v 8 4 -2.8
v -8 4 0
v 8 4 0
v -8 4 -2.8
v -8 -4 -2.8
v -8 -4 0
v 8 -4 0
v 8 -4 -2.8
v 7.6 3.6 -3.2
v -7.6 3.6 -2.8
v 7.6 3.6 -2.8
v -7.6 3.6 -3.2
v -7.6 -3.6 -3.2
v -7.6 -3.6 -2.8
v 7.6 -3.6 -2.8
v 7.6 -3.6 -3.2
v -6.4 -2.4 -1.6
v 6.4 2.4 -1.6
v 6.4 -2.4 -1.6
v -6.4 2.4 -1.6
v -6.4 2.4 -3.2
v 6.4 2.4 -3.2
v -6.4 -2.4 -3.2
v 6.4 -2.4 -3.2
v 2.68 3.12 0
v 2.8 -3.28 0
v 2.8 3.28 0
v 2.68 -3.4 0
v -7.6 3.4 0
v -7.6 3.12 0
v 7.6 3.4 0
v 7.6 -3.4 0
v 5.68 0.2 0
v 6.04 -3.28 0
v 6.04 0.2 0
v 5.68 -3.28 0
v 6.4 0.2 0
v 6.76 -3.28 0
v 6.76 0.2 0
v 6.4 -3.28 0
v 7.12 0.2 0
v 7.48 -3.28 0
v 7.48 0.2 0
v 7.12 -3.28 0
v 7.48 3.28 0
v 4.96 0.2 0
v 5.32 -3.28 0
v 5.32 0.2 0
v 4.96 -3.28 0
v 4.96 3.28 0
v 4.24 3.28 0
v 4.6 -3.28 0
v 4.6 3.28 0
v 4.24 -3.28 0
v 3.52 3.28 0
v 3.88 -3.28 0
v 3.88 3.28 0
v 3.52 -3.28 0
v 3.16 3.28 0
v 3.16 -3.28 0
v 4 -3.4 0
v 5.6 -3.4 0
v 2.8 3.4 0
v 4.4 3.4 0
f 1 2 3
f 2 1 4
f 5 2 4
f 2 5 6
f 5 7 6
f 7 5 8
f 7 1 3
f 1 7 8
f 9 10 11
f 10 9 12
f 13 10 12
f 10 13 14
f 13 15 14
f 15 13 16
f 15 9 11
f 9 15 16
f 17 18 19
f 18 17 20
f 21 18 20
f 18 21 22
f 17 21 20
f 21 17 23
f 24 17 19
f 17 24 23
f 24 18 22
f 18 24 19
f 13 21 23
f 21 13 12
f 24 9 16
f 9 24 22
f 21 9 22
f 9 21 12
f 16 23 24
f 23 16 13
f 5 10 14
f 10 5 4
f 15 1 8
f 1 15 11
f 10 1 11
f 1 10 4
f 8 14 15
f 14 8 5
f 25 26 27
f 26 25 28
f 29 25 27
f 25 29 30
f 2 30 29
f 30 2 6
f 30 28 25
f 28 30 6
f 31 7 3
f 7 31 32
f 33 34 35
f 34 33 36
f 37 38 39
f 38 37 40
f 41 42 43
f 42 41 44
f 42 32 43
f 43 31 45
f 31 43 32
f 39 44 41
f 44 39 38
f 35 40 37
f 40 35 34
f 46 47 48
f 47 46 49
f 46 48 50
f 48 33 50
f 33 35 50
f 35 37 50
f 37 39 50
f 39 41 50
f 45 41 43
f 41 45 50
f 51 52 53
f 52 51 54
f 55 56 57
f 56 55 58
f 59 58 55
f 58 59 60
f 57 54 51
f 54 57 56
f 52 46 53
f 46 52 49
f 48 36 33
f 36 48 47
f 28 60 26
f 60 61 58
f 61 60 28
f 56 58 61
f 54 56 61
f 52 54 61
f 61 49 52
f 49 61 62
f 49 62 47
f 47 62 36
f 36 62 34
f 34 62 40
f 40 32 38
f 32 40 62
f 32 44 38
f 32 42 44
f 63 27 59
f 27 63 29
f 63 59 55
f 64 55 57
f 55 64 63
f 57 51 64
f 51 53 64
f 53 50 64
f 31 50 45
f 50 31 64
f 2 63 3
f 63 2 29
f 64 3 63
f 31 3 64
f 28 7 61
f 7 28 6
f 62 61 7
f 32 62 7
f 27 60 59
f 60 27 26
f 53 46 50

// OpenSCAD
// file: ../p/box5.scad
use <../lib.scad>
function ldraw_lib__box5() = [
// 0 Box with 5 Faces and All Edges
// 0 Name: box5.dat
// 0 Author: James Jessiman
// 0 !LDRAW_ORG Primitive UPDATE 2012-01
// 0 !LICENSE Licensed under CC BY 2.0 and CC BY 4.0 : see CAreadme.txt
// 
// 0 BFC CERTIFY CCW
  [0,"BFC","CERTIFY"],
  [0,"BFC","CCW"],
// 
// 0 !HISTORY 2002-04-03 [sbliss] Modified for BFC compliance
// 0 !HISTORY 2002-04-25 [PTadmin] Official Update 2002-02
// 0 !HISTORY 2007-06-24 [PTadmin] Header formatted for Contributor Agreement
// 0 !HISTORY 2008-07-01 [PTadmin] Official Update 2008-01
// 0 !HISTORY 2012-02-16 [Philo] Changed to CCW
// 0 !HISTORY 2012-03-30 [PTadmin] Official Update 2012-01
// 
// 
// 2 24 1 1 1 -1 1 1
  [2,24,1,1,1,-1,1,1],
// 2 24 -1 1 1 -1 1 -1
  [2,24,-1,1,1,-1,1,-1],
// 2 24 -1 1 -1 1 1 -1
  [2,24,-1,1,-1,1,1,-1],
// 2 24 1 1 -1 1 1 1
  [2,24,1,1,-1,1,1,1],
// 2 24 1 0 1 -1 0 1
  [2,24,1,0,1,-1,0,1],
// 2 24 -1 0 1 -1 0 -1
  [2,24,-1,0,1,-1,0,-1],
// 2 24 -1 0 -1 1 0 -1
  [2,24,-1,0,-1,1,0,-1],
// 2 24 1 0 -1 1 0 1
  [2,24,1,0,-1,1,0,1],
// 2 24 1 0 1 1 1 1
  [2,24,1,0,1,1,1,1],
// 2 24 -1 0 1 -1 1 1
  [2,24,-1,0,1,-1,1,1],
// 2 24 1 0 -1 1 1 -1
  [2,24,1,0,-1,1,1,-1],
// 2 24 -1 0 -1 -1 1 -1
  [2,24,-1,0,-1,-1,1,-1],
// 4 16 -1 1 1 1 1 1 1 1 -1 -1 1 -1
  [4,16,-1,1,1,1,1,1,1,1,-1,-1,1,-1],
// 4 16 -1 1 1 -1 0 1 1 0 1 1 1 1
  [4,16,-1,1,1,-1,0,1,1,0,1,1,1,1],
// 4 16 -1 1 -1 -1 0 -1 -1 0 1 -1 1 1
  [4,16,-1,1,-1,-1,0,-1,-1,0,1,-1,1,1],
// 4 16 1 1 -1 1 0 -1 -1 0 -1 -1 1 -1
  [4,16,1,1,-1,1,0,-1,-1,0,-1,-1,1,-1],
// 4 16 1 1 1 1 0 1 1 0 -1 1 1 -1
  [4,16,1,1,1,1,0,1,1,0,-1,1,1,-1],
];
module ldraw_lib__box5(step=0, col=false, unit=2/5, alt=false, line=0.2, solid=!$preview)
    makepoly(ldraw_lib__box5(), step=step, col=col, unit=unit, alt=alt, line=line, solid=solid);
ldraw_lib__box5(line=0.2);
// file: ../p/box4.scad
use <../lib.scad>
function ldraw_lib__box4() = [
// 0 Box with 4 Faces (2 Parallel Pairs) and All Edges
// 0 Name: box4.dat
// 0 Author: James Jessiman
// 0 !LDRAW_ORG Primitive UPDATE 2012-01
// 0 !LICENSE Licensed under CC BY 2.0 and CC BY 4.0 : see CAreadme.txt
// 
// 0 BFC CERTIFY CCW
  [0,"BFC","CERTIFY"],
  [0,"BFC","CCW"],
// 
// 0 !HISTORY 2002-04-03 [sbliss] Modified for BFC compliance
// 0 !HISTORY 2002-04-25 [PTadmin] Official Update 2002-02
// 0 !HISTORY 2007-06-24 [PTadmin] Header formatted for Contributor Agreement
// 0 !HISTORY 2008-07-01 [PTadmin] Official Update 2008-01
// 0 !HISTORY 2012-02-16 [Philo] Changed to CCW
// 0 !HISTORY 2012-03-30 [PTadmin] Official Update 2012-01
// 
// 
// 2 24 1 1 1 -1 1 1
  [2,24,1,1,1,-1,1,1],
// 2 24 -1 1 1 -1 1 -1
  [2,24,-1,1,1,-1,1,-1],
// 2 24 -1 1 -1 1 1 -1
  [2,24,-1,1,-1,1,1,-1],
// 2 24 1 1 -1 1 1 1
  [2,24,1,1,-1,1,1,1],
// 2 24 1 0 1 -1 0 1
  [2,24,1,0,1,-1,0,1],
// 2 24 -1 0 1 -1 0 -1
  [2,24,-1,0,1,-1,0,-1],
// 2 24 -1 0 -1 1 0 -1
  [2,24,-1,0,-1,1,0,-1],
// 2 24 1 0 -1 1 0 1
  [2,24,1,0,-1,1,0,1],
// 2 24 1 0 1 1 1 1
  [2,24,1,0,1,1,1,1],
// 2 24 -1 0 1 -1 1 1
  [2,24,-1,0,1,-1,1,1],
// 2 24 1 0 -1 1 1 -1
  [2,24,1,0,-1,1,1,-1],
// 2 24 -1 0 -1 -1 1 -1
  [2,24,-1,0,-1,-1,1,-1],
// 4 16 -1 1 1 -1 0 1 1 0 1 1 1 1
  [4,16,-1,1,1,-1,0,1,1,0,1,1,1,1],
// 4 16 -1 1 -1 -1 0 -1 -1 0 1 -1 1 1
  [4,16,-1,1,-1,-1,0,-1,-1,0,1,-1,1,1],
// 4 16 1 1 -1 1 0 -1 -1 0 -1 -1 1 -1
  [4,16,1,1,-1,1,0,-1,-1,0,-1,-1,1,-1],
// 4 16 1 1 1 1 0 1 1 0 -1 1 1 -1
  [4,16,1,1,1,1,0,1,1,0,-1,1,1,-1],
];
module ldraw_lib__box4(step=0, col=false, unit=2/5, alt=false, line=0.2, solid=!$preview)
    makepoly(ldraw_lib__box4(), step=step, col=col, unit=unit, alt=alt, line=line, solid=solid);
ldraw_lib__box4(line=0.2);
// file: s/3069bs01.scad
use <../../lib.scad>
use <../../p/box4.scad>
use <../../p/box5.scad>
function ldraw_lib__s__3069bs01() = [
// 0 ~Tile  1 x  2 with Groove without Top Face
// 0 Name: s\3069bs01.dat
// 0 Author: Santeri Piippo [arezey]
// 0 !LDRAW_ORG Subpart UPDATE 2010-02
// 0 !LICENSE Licensed under CC BY 2.0 and CC BY 4.0 : see CAreadme.txt
// 
// 0 BFC CERTIFY CCW
  [0,"BFC","CERTIFY"],
  [0,"BFC","CCW"],
// 
// 0 !HISTORY 2010-07-05 [PTadmin] Official Update 2010-02
// 
// 
// 1 16 0 0 0 20 0 0 0 7 0 0 0 10 box4.dat
  [1,16,0,0,0,20,0,0,0,7,0,0,0,10, ldraw_lib__box4()],
// 1 16 0 7 0 19 0 0 0 1 0 0 0 9 box4.dat
  [1,16,0,7,0,19,0,0,0,1,0,0,0,9, ldraw_lib__box4()],
// 0 BFC INVERTNEXT
  [0,"BFC","INVERTNEXT"],
// 1 16 0 8 0 16 0 0 0 -4 0 0 0 6 box5.dat
  [1,16,0,8,0,16,0,0,0,-4,0,0,0,6, ldraw_lib__box5()],
// 4 16 -19 8 9 -16 8 6 -16 8 -6 -19 8 -9
  [4,16,-19,8,9,-16,8,6,-16,8,-6,-19,8,-9],
// 4 16 19 8 -9 16 8 -6 16 8 6 19 8 9
  [4,16,19,8,-9,16,8,-6,16,8,6,19,8,9],
// 4 16 19 8 9 16 8 6 -16 8 6 -19 8 9
  [4,16,19,8,9,16,8,6,-16,8,6,-19,8,9],
// 4 16 -19 8 -9 -16 8 -6 16 8 -6 19 8 -9
  [4,16,-19,8,-9,-16,8,-6,16,8,-6,19,8,-9],
// 4 16 -20 7 10 -19 7 9 -19 7 -9 -20 7 -10
  [4,16,-20,7,10,-19,7,9,-19,7,-9,-20,7,-10],
// 4 16 20 7 -10 19 7 -9 19 7 9 20 7 10
  [4,16,20,7,-10,19,7,-9,19,7,9,20,7,10],
// 4 16 20 7 10 19 7 9 -19 7 9 -20 7 10
  [4,16,20,7,10,19,7,9,-19,7,9,-20,7,10],
// 4 16 -20 7 -10 -19 7 -9 19 7 -9 20 7 -10
  [4,16,-20,7,-10,-19,7,-9,19,7,-9,20,7,-10],
// 0 //
];
module ldraw_lib__s__3069bs01(step=0, col=false, unit=2/5, alt=false, line=0.2, solid=!$preview)
    makepoly(ldraw_lib__s__3069bs01(), step=step, col=col, unit=unit, alt=alt, line=line, solid=solid);
ldraw_lib__s__3069bs01(line=0.2);
// main file
use <../lib.scad>
use <s/3069bs01.scad>
function ldraw_lib__3069bp56() = [
// 0 Tile  1 x  2 with United States of America Flag Pattern
// 0 Name: 3069bp56.dat
// 0 Author: Evert-Jan Boer [ejboer]
// 0 !LDRAW_ORG Part UPDATE 2017-01
// 0 !LICENSE Licensed under CC BY 2.0 and CC BY 4.0 : see CAreadme.txt
// 
// 0 BFC CERTIFY CCW
  [0,"BFC","CERTIFY"],
  [0,"BFC","CCW"],
// 
// 0 !KEYWORDS Apollo, BrickLink 3069bpb587, Moon, NASA, Rocket, Saturn V
// 0 !KEYWORDS Set 21309
// 
// 0 !HISTORY 2017-12-30 [PTadmin] Official Update 2017-01
// 
// 
// 1 16 0 0 0 1 0 0 0 1 0 0 0 1 s\3069bs01.dat
  [1,16,0,0,0,1,0,0,0,1,0,0,0,1, ldraw_lib__s__3069bs01()],
// 
// 0 BFC NOCLIP
  [0,"BFC","NOCLIP"],
// 
// 4 0 6.7 0 7.8 6.7 0 -8.5 7 0 -8.2 7 0 8.2
  [4,0,6.7,0,7.8,6.7,0,-8.5,7,0,-8.2,7,0,8.2],
// 4 0 -19 0 8.5 -19 0 7.8 6.7 0 7.8 7 0 8.2
  [4,0,-19,0,8.5,-19,0,7.8,6.7,0,7.8,7,0,8.2],
// 4 16 -19 0 8.5 -20 0 10 -20 0 -10 -19 0 7.8
  [4,16,-19,0,8.5,-20,0,10,-20,0,-10,-19,0,7.8],
// 4 16 6.7 0 7.8 -19 0 7.8 -20 0 -10 6.7 0 -8.5
  [4,16,6.7,0,7.8,-19,0,7.8,-20,0,-10,6.7,0,-8.5],
// 4 16 19 0 -8.5 20 0 -10 20 0 10 19 0 8.5
  [4,16,19,0,-8.5,20,0,-10,20,0,10,19,0,8.5],
// 4 4 15.1 0 0.5 14.2 0 0.5 14.2 0 -8.2 15.1 0 -8.2
  [4,4,15.1,0,0.5,14.2,0,0.5,14.2,0,-8.2,15.1,0,-8.2],
// 4 4 16.9 0 0.5 16 0 0.5 16 0 -8.2 16.9 0 -8.2
  [4,4,16.9,0,0.5,16,0,0.5,16,0,-8.2,16.9,0,-8.2],
// 4 4 18.7 0 0.5 17.8 0 0.5 17.8 0 -8.2 18.7 0 -8.2
  [4,4,18.7,0,0.5,17.8,0,0.5,17.8,0,-8.2,18.7,0,-8.2],
// 3 0 18.7 0 -8.2 19 0 -8.5 18.7 0 0.5
  [3,0,18.7,0,-8.2,19,0,-8.5,18.7,0,0.5],
// 4 0 18.7 0 8.2 18.7 0 0.5 19 0 -8.5 19 0 8.5
  [4,0,18.7,0,8.2,18.7,0,0.5,19,0,-8.5,19,0,8.5],
// 4 15 17.8 0 0.5 16.9 0 0.5 16.9 0 -8.2 17.8 0 -8.2
  [4,15,17.8,0,0.5,16.9,0,0.5,16.9,0,-8.2,17.8,0,-8.2],
// 4 15 16 0 0.5 15.1 0 0.5 15.1 0 -8.2 16 0 -8.2
  [4,15,16,0,0.5,15.1,0,0.5,15.1,0,-8.2,16,0,-8.2],
// 4 4 13.3 0 0.5 12.4 0 0.5 12.4 0 -8.2 13.3 0 -8.2
  [4,4,13.3,0,0.5,12.4,0,0.5,12.4,0,-8.2,13.3,0,-8.2],
// 3 1 12.4 0 0.5 13.3 0 0.5 12.4 0 8.2
  [3,1,12.4,0,0.5,13.3,0,0.5,12.4,0,8.2],
// 3 1 13.3 0 0.5 14.2 0 0.5 12.4 0 8.2
  [3,1,13.3,0,0.5,14.2,0,0.5,12.4,0,8.2],
// 3 1 14.2 0 0.5 15.1 0 0.5 12.4 0 8.2
  [3,1,14.2,0,0.5,15.1,0,0.5,12.4,0,8.2],
// 3 1 15.1 0 0.5 16 0 0.5 12.4 0 8.2
  [3,1,15.1,0,0.5,16,0,0.5,12.4,0,8.2],
// 3 1 16 0 0.5 16.9 0 0.5 12.4 0 8.2
  [3,1,16,0,0.5,16.9,0,0.5,12.4,0,8.2],
// 3 1 16.9 0 0.5 17.8 0 0.5 12.4 0 8.2
  [3,1,16.9,0,0.5,17.8,0,0.5,12.4,0,8.2],
// 4 1 12.4 0 8.2 17.8 0 0.5 18.7 0 0.5 18.7 0 8.2
  [4,1,12.4,0,8.2,17.8,0,0.5,18.7,0,0.5,18.7,0,8.2],
// 4 4 11.5 0 8.2 10.6 0 8.2 10.6 0 -8.2 11.5 0 -8.2
  [4,4,11.5,0,8.2,10.6,0,8.2,10.6,0,-8.2,11.5,0,-8.2],
// 4 4 9.7 0 8.2 8.8 0 8.2 8.8 0 -8.2 9.7 0 -8.2
  [4,4,9.7,0,8.2,8.8,0,8.2,8.8,0,-8.2,9.7,0,-8.2],
// 4 15 8.8 0 8.2 7.9 0 8.2 7.9 0 -8.2 8.8 0 -8.2
  [4,15,8.8,0,8.2,7.9,0,8.2,7.9,0,-8.2,8.8,0,-8.2],
// 4 15 10.6 0 8.2 9.7 0 8.2 9.7 0 -8.2 10.6 0 -8.2
  [4,15,10.6,0,8.2,9.7,0,8.2,9.7,0,-8.2,10.6,0,-8.2],
// 4 15 11.5 0 -8.2 12.4 0 -8.2 12.4 0 0.5 11.5 0 8.2
  [4,15,11.5,0,-8.2,12.4,0,-8.2,12.4,0,0.5,11.5,0,8.2],
// 4 15 14.2 0 0.5 13.3 0 0.5 13.3 0 -8.2 14.2 0 -8.2
  [4,15,14.2,0,0.5,13.3,0,0.5,13.3,0,-8.2,14.2,0,-8.2],
// 3 0 6.7 0 -8.5 7.9 0 -8.2 7 0 -8.2
  [3,0,6.7,0,-8.5,7.9,0,-8.2,7,0,-8.2],
// 4 0 8.8 0 -8.2 7.9 0 -8.2 6.7 0 -8.5 10 0 -8.5
  [4,0,8.8,0,-8.2,7.9,0,-8.2,6.7,0,-8.5,10,0,-8.5],
// 3 0 9.7 0 -8.2 8.8 0 -8.2 10 0 -8.5
  [3,0,9.7,0,-8.2,8.8,0,-8.2,10,0,-8.5],
// 3 0 10.6 0 -8.2 9.7 0 -8.2 10 0 -8.5
  [3,0,10.6,0,-8.2,9.7,0,-8.2,10,0,-8.5],
// 3 0 11.5 0 -8.2 10.6 0 -8.2 10 0 -8.5
  [3,0,11.5,0,-8.2,10.6,0,-8.2,10,0,-8.5],
// 4 0 12.4 0 -8.2 11.5 0 -8.2 10 0 -8.5 14 0 -8.5
  [4,0,12.4,0,-8.2,11.5,0,-8.2,10,0,-8.5,14,0,-8.5],
// 3 0 12.4 0 -8.2 14 0 -8.5 13.3 0 -8.2
  [3,0,12.4,0,-8.2,14,0,-8.5,13.3,0,-8.2],
// 3 0 13.3 0 -8.2 14 0 -8.5 14.2 0 -8.2
  [3,0,13.3,0,-8.2,14,0,-8.5,14.2,0,-8.2],
// 3 0 14.2 0 -8.2 14 0 -8.5 15.1 0 -8.2
  [3,0,14.2,0,-8.2,14,0,-8.5,15.1,0,-8.2],
// 3 0 15.1 0 -8.2 14 0 -8.5 16 0 -8.2
  [3,0,15.1,0,-8.2,14,0,-8.5,16,0,-8.2],
// 4 0 16.9 0 -8.2 16 0 -8.2 14 0 -8.5 19 0 -8.5
  [4,0,16.9,0,-8.2,16,0,-8.2,14,0,-8.5,19,0,-8.5],
// 3 0 19 0 -8.5 17.8 0 -8.2 16.9 0 -8.2
  [3,0,19,0,-8.5,17.8,0,-8.2,16.9,0,-8.2],
// 3 0 19 0 -8.5 18.7 0 -8.2 17.8 0 -8.2
  [3,0,19,0,-8.5,18.7,0,-8.2,17.8,0,-8.2],
// 4 0 7 0 8.5 -19 0 8.5 7 0 8.2 7.9 0 8.2
  [4,0,7,0,8.5,-19,0,8.5,7,0,8.2,7.9,0,8.2],
// 3 0 7 0 8.5 7.9 0 8.2 8.8 0 8.2
  [3,0,7,0,8.5,7.9,0,8.2,8.8,0,8.2],
// 4 0 7 0 8.5 8.8 0 8.2 9.7 0 8.2 11 0 8.5
  [4,0,7,0,8.5,8.8,0,8.2,9.7,0,8.2,11,0,8.5],
// 3 0 9.7 0 8.2 10.6 0 8.2 11 0 8.5
  [3,0,9.7,0,8.2,10.6,0,8.2,11,0,8.5],
// 3 0 10.6 0 8.2 11.5 0 8.2 11 0 8.5
  [3,0,10.6,0,8.2,11.5,0,8.2,11,0,8.5],
// 3 0 11.5 0 8.2 12.4 0 8.2 11 0 8.5
  [3,0,11.5,0,8.2,12.4,0,8.2,11,0,8.5],
// 4 0 11 0 8.5 12.4 0 8.2 18.7 0 8.2 19 0 8.5
  [4,0,11,0,8.5,12.4,0,8.2,18.7,0,8.2,19,0,8.5],
// 4 16 -20 0 10 -19 0 8.5 7 0 8.5 20 0 10
  [4,16,-20,0,10,-19,0,8.5,7,0,8.5,20,0,10],
// 3 16 11 0 8.5 20 0 10 7 0 8.5
  [3,16,11,0,8.5,20,0,10,7,0,8.5],
// 3 16 19 0 8.5 20 0 10 11 0 8.5
  [3,16,19,0,8.5,20,0,10,11,0,8.5],
// 4 16 6.7 0 -8.5 -20 0 -10 20 0 -10 10 0 -8.5
  [4,16,6.7,0,-8.5,-20,0,-10,20,0,-10,10,0,-8.5],
// 3 16 14 0 -8.5 10 0 -8.5 20 0 -10
  [3,16,14,0,-8.5,10,0,-8.5,20,0,-10],
// 3 16 19 0 -8.5 14 0 -8.5 20 0 -10
  [3,16,19,0,-8.5,14,0,-8.5,20,0,-10],
// 4 4 7.9 0 8.2 7 0 8.2 7 0 -8.2 7.9 0 -8.2
  [4,4,7.9,0,8.2,7,0,8.2,7,0,-8.2,7.9,0,-8.2],
// 3 15 11.5 0 8.2 12.4 0 0.5 12.4 0 8.2
  [3,15,11.5,0,8.2,12.4,0,0.5,12.4,0,8.2],
];
module ldraw_lib__3069bp56(step=0, col=false, unit=2/5, alt=false, line=0.2, solid=!$preview)
    makepoly(ldraw_lib__3069bp56(), step=step, col=col, unit=unit, alt=alt, line=line, solid=solid);
ldraw_lib__3069bp56(line=0.2);
